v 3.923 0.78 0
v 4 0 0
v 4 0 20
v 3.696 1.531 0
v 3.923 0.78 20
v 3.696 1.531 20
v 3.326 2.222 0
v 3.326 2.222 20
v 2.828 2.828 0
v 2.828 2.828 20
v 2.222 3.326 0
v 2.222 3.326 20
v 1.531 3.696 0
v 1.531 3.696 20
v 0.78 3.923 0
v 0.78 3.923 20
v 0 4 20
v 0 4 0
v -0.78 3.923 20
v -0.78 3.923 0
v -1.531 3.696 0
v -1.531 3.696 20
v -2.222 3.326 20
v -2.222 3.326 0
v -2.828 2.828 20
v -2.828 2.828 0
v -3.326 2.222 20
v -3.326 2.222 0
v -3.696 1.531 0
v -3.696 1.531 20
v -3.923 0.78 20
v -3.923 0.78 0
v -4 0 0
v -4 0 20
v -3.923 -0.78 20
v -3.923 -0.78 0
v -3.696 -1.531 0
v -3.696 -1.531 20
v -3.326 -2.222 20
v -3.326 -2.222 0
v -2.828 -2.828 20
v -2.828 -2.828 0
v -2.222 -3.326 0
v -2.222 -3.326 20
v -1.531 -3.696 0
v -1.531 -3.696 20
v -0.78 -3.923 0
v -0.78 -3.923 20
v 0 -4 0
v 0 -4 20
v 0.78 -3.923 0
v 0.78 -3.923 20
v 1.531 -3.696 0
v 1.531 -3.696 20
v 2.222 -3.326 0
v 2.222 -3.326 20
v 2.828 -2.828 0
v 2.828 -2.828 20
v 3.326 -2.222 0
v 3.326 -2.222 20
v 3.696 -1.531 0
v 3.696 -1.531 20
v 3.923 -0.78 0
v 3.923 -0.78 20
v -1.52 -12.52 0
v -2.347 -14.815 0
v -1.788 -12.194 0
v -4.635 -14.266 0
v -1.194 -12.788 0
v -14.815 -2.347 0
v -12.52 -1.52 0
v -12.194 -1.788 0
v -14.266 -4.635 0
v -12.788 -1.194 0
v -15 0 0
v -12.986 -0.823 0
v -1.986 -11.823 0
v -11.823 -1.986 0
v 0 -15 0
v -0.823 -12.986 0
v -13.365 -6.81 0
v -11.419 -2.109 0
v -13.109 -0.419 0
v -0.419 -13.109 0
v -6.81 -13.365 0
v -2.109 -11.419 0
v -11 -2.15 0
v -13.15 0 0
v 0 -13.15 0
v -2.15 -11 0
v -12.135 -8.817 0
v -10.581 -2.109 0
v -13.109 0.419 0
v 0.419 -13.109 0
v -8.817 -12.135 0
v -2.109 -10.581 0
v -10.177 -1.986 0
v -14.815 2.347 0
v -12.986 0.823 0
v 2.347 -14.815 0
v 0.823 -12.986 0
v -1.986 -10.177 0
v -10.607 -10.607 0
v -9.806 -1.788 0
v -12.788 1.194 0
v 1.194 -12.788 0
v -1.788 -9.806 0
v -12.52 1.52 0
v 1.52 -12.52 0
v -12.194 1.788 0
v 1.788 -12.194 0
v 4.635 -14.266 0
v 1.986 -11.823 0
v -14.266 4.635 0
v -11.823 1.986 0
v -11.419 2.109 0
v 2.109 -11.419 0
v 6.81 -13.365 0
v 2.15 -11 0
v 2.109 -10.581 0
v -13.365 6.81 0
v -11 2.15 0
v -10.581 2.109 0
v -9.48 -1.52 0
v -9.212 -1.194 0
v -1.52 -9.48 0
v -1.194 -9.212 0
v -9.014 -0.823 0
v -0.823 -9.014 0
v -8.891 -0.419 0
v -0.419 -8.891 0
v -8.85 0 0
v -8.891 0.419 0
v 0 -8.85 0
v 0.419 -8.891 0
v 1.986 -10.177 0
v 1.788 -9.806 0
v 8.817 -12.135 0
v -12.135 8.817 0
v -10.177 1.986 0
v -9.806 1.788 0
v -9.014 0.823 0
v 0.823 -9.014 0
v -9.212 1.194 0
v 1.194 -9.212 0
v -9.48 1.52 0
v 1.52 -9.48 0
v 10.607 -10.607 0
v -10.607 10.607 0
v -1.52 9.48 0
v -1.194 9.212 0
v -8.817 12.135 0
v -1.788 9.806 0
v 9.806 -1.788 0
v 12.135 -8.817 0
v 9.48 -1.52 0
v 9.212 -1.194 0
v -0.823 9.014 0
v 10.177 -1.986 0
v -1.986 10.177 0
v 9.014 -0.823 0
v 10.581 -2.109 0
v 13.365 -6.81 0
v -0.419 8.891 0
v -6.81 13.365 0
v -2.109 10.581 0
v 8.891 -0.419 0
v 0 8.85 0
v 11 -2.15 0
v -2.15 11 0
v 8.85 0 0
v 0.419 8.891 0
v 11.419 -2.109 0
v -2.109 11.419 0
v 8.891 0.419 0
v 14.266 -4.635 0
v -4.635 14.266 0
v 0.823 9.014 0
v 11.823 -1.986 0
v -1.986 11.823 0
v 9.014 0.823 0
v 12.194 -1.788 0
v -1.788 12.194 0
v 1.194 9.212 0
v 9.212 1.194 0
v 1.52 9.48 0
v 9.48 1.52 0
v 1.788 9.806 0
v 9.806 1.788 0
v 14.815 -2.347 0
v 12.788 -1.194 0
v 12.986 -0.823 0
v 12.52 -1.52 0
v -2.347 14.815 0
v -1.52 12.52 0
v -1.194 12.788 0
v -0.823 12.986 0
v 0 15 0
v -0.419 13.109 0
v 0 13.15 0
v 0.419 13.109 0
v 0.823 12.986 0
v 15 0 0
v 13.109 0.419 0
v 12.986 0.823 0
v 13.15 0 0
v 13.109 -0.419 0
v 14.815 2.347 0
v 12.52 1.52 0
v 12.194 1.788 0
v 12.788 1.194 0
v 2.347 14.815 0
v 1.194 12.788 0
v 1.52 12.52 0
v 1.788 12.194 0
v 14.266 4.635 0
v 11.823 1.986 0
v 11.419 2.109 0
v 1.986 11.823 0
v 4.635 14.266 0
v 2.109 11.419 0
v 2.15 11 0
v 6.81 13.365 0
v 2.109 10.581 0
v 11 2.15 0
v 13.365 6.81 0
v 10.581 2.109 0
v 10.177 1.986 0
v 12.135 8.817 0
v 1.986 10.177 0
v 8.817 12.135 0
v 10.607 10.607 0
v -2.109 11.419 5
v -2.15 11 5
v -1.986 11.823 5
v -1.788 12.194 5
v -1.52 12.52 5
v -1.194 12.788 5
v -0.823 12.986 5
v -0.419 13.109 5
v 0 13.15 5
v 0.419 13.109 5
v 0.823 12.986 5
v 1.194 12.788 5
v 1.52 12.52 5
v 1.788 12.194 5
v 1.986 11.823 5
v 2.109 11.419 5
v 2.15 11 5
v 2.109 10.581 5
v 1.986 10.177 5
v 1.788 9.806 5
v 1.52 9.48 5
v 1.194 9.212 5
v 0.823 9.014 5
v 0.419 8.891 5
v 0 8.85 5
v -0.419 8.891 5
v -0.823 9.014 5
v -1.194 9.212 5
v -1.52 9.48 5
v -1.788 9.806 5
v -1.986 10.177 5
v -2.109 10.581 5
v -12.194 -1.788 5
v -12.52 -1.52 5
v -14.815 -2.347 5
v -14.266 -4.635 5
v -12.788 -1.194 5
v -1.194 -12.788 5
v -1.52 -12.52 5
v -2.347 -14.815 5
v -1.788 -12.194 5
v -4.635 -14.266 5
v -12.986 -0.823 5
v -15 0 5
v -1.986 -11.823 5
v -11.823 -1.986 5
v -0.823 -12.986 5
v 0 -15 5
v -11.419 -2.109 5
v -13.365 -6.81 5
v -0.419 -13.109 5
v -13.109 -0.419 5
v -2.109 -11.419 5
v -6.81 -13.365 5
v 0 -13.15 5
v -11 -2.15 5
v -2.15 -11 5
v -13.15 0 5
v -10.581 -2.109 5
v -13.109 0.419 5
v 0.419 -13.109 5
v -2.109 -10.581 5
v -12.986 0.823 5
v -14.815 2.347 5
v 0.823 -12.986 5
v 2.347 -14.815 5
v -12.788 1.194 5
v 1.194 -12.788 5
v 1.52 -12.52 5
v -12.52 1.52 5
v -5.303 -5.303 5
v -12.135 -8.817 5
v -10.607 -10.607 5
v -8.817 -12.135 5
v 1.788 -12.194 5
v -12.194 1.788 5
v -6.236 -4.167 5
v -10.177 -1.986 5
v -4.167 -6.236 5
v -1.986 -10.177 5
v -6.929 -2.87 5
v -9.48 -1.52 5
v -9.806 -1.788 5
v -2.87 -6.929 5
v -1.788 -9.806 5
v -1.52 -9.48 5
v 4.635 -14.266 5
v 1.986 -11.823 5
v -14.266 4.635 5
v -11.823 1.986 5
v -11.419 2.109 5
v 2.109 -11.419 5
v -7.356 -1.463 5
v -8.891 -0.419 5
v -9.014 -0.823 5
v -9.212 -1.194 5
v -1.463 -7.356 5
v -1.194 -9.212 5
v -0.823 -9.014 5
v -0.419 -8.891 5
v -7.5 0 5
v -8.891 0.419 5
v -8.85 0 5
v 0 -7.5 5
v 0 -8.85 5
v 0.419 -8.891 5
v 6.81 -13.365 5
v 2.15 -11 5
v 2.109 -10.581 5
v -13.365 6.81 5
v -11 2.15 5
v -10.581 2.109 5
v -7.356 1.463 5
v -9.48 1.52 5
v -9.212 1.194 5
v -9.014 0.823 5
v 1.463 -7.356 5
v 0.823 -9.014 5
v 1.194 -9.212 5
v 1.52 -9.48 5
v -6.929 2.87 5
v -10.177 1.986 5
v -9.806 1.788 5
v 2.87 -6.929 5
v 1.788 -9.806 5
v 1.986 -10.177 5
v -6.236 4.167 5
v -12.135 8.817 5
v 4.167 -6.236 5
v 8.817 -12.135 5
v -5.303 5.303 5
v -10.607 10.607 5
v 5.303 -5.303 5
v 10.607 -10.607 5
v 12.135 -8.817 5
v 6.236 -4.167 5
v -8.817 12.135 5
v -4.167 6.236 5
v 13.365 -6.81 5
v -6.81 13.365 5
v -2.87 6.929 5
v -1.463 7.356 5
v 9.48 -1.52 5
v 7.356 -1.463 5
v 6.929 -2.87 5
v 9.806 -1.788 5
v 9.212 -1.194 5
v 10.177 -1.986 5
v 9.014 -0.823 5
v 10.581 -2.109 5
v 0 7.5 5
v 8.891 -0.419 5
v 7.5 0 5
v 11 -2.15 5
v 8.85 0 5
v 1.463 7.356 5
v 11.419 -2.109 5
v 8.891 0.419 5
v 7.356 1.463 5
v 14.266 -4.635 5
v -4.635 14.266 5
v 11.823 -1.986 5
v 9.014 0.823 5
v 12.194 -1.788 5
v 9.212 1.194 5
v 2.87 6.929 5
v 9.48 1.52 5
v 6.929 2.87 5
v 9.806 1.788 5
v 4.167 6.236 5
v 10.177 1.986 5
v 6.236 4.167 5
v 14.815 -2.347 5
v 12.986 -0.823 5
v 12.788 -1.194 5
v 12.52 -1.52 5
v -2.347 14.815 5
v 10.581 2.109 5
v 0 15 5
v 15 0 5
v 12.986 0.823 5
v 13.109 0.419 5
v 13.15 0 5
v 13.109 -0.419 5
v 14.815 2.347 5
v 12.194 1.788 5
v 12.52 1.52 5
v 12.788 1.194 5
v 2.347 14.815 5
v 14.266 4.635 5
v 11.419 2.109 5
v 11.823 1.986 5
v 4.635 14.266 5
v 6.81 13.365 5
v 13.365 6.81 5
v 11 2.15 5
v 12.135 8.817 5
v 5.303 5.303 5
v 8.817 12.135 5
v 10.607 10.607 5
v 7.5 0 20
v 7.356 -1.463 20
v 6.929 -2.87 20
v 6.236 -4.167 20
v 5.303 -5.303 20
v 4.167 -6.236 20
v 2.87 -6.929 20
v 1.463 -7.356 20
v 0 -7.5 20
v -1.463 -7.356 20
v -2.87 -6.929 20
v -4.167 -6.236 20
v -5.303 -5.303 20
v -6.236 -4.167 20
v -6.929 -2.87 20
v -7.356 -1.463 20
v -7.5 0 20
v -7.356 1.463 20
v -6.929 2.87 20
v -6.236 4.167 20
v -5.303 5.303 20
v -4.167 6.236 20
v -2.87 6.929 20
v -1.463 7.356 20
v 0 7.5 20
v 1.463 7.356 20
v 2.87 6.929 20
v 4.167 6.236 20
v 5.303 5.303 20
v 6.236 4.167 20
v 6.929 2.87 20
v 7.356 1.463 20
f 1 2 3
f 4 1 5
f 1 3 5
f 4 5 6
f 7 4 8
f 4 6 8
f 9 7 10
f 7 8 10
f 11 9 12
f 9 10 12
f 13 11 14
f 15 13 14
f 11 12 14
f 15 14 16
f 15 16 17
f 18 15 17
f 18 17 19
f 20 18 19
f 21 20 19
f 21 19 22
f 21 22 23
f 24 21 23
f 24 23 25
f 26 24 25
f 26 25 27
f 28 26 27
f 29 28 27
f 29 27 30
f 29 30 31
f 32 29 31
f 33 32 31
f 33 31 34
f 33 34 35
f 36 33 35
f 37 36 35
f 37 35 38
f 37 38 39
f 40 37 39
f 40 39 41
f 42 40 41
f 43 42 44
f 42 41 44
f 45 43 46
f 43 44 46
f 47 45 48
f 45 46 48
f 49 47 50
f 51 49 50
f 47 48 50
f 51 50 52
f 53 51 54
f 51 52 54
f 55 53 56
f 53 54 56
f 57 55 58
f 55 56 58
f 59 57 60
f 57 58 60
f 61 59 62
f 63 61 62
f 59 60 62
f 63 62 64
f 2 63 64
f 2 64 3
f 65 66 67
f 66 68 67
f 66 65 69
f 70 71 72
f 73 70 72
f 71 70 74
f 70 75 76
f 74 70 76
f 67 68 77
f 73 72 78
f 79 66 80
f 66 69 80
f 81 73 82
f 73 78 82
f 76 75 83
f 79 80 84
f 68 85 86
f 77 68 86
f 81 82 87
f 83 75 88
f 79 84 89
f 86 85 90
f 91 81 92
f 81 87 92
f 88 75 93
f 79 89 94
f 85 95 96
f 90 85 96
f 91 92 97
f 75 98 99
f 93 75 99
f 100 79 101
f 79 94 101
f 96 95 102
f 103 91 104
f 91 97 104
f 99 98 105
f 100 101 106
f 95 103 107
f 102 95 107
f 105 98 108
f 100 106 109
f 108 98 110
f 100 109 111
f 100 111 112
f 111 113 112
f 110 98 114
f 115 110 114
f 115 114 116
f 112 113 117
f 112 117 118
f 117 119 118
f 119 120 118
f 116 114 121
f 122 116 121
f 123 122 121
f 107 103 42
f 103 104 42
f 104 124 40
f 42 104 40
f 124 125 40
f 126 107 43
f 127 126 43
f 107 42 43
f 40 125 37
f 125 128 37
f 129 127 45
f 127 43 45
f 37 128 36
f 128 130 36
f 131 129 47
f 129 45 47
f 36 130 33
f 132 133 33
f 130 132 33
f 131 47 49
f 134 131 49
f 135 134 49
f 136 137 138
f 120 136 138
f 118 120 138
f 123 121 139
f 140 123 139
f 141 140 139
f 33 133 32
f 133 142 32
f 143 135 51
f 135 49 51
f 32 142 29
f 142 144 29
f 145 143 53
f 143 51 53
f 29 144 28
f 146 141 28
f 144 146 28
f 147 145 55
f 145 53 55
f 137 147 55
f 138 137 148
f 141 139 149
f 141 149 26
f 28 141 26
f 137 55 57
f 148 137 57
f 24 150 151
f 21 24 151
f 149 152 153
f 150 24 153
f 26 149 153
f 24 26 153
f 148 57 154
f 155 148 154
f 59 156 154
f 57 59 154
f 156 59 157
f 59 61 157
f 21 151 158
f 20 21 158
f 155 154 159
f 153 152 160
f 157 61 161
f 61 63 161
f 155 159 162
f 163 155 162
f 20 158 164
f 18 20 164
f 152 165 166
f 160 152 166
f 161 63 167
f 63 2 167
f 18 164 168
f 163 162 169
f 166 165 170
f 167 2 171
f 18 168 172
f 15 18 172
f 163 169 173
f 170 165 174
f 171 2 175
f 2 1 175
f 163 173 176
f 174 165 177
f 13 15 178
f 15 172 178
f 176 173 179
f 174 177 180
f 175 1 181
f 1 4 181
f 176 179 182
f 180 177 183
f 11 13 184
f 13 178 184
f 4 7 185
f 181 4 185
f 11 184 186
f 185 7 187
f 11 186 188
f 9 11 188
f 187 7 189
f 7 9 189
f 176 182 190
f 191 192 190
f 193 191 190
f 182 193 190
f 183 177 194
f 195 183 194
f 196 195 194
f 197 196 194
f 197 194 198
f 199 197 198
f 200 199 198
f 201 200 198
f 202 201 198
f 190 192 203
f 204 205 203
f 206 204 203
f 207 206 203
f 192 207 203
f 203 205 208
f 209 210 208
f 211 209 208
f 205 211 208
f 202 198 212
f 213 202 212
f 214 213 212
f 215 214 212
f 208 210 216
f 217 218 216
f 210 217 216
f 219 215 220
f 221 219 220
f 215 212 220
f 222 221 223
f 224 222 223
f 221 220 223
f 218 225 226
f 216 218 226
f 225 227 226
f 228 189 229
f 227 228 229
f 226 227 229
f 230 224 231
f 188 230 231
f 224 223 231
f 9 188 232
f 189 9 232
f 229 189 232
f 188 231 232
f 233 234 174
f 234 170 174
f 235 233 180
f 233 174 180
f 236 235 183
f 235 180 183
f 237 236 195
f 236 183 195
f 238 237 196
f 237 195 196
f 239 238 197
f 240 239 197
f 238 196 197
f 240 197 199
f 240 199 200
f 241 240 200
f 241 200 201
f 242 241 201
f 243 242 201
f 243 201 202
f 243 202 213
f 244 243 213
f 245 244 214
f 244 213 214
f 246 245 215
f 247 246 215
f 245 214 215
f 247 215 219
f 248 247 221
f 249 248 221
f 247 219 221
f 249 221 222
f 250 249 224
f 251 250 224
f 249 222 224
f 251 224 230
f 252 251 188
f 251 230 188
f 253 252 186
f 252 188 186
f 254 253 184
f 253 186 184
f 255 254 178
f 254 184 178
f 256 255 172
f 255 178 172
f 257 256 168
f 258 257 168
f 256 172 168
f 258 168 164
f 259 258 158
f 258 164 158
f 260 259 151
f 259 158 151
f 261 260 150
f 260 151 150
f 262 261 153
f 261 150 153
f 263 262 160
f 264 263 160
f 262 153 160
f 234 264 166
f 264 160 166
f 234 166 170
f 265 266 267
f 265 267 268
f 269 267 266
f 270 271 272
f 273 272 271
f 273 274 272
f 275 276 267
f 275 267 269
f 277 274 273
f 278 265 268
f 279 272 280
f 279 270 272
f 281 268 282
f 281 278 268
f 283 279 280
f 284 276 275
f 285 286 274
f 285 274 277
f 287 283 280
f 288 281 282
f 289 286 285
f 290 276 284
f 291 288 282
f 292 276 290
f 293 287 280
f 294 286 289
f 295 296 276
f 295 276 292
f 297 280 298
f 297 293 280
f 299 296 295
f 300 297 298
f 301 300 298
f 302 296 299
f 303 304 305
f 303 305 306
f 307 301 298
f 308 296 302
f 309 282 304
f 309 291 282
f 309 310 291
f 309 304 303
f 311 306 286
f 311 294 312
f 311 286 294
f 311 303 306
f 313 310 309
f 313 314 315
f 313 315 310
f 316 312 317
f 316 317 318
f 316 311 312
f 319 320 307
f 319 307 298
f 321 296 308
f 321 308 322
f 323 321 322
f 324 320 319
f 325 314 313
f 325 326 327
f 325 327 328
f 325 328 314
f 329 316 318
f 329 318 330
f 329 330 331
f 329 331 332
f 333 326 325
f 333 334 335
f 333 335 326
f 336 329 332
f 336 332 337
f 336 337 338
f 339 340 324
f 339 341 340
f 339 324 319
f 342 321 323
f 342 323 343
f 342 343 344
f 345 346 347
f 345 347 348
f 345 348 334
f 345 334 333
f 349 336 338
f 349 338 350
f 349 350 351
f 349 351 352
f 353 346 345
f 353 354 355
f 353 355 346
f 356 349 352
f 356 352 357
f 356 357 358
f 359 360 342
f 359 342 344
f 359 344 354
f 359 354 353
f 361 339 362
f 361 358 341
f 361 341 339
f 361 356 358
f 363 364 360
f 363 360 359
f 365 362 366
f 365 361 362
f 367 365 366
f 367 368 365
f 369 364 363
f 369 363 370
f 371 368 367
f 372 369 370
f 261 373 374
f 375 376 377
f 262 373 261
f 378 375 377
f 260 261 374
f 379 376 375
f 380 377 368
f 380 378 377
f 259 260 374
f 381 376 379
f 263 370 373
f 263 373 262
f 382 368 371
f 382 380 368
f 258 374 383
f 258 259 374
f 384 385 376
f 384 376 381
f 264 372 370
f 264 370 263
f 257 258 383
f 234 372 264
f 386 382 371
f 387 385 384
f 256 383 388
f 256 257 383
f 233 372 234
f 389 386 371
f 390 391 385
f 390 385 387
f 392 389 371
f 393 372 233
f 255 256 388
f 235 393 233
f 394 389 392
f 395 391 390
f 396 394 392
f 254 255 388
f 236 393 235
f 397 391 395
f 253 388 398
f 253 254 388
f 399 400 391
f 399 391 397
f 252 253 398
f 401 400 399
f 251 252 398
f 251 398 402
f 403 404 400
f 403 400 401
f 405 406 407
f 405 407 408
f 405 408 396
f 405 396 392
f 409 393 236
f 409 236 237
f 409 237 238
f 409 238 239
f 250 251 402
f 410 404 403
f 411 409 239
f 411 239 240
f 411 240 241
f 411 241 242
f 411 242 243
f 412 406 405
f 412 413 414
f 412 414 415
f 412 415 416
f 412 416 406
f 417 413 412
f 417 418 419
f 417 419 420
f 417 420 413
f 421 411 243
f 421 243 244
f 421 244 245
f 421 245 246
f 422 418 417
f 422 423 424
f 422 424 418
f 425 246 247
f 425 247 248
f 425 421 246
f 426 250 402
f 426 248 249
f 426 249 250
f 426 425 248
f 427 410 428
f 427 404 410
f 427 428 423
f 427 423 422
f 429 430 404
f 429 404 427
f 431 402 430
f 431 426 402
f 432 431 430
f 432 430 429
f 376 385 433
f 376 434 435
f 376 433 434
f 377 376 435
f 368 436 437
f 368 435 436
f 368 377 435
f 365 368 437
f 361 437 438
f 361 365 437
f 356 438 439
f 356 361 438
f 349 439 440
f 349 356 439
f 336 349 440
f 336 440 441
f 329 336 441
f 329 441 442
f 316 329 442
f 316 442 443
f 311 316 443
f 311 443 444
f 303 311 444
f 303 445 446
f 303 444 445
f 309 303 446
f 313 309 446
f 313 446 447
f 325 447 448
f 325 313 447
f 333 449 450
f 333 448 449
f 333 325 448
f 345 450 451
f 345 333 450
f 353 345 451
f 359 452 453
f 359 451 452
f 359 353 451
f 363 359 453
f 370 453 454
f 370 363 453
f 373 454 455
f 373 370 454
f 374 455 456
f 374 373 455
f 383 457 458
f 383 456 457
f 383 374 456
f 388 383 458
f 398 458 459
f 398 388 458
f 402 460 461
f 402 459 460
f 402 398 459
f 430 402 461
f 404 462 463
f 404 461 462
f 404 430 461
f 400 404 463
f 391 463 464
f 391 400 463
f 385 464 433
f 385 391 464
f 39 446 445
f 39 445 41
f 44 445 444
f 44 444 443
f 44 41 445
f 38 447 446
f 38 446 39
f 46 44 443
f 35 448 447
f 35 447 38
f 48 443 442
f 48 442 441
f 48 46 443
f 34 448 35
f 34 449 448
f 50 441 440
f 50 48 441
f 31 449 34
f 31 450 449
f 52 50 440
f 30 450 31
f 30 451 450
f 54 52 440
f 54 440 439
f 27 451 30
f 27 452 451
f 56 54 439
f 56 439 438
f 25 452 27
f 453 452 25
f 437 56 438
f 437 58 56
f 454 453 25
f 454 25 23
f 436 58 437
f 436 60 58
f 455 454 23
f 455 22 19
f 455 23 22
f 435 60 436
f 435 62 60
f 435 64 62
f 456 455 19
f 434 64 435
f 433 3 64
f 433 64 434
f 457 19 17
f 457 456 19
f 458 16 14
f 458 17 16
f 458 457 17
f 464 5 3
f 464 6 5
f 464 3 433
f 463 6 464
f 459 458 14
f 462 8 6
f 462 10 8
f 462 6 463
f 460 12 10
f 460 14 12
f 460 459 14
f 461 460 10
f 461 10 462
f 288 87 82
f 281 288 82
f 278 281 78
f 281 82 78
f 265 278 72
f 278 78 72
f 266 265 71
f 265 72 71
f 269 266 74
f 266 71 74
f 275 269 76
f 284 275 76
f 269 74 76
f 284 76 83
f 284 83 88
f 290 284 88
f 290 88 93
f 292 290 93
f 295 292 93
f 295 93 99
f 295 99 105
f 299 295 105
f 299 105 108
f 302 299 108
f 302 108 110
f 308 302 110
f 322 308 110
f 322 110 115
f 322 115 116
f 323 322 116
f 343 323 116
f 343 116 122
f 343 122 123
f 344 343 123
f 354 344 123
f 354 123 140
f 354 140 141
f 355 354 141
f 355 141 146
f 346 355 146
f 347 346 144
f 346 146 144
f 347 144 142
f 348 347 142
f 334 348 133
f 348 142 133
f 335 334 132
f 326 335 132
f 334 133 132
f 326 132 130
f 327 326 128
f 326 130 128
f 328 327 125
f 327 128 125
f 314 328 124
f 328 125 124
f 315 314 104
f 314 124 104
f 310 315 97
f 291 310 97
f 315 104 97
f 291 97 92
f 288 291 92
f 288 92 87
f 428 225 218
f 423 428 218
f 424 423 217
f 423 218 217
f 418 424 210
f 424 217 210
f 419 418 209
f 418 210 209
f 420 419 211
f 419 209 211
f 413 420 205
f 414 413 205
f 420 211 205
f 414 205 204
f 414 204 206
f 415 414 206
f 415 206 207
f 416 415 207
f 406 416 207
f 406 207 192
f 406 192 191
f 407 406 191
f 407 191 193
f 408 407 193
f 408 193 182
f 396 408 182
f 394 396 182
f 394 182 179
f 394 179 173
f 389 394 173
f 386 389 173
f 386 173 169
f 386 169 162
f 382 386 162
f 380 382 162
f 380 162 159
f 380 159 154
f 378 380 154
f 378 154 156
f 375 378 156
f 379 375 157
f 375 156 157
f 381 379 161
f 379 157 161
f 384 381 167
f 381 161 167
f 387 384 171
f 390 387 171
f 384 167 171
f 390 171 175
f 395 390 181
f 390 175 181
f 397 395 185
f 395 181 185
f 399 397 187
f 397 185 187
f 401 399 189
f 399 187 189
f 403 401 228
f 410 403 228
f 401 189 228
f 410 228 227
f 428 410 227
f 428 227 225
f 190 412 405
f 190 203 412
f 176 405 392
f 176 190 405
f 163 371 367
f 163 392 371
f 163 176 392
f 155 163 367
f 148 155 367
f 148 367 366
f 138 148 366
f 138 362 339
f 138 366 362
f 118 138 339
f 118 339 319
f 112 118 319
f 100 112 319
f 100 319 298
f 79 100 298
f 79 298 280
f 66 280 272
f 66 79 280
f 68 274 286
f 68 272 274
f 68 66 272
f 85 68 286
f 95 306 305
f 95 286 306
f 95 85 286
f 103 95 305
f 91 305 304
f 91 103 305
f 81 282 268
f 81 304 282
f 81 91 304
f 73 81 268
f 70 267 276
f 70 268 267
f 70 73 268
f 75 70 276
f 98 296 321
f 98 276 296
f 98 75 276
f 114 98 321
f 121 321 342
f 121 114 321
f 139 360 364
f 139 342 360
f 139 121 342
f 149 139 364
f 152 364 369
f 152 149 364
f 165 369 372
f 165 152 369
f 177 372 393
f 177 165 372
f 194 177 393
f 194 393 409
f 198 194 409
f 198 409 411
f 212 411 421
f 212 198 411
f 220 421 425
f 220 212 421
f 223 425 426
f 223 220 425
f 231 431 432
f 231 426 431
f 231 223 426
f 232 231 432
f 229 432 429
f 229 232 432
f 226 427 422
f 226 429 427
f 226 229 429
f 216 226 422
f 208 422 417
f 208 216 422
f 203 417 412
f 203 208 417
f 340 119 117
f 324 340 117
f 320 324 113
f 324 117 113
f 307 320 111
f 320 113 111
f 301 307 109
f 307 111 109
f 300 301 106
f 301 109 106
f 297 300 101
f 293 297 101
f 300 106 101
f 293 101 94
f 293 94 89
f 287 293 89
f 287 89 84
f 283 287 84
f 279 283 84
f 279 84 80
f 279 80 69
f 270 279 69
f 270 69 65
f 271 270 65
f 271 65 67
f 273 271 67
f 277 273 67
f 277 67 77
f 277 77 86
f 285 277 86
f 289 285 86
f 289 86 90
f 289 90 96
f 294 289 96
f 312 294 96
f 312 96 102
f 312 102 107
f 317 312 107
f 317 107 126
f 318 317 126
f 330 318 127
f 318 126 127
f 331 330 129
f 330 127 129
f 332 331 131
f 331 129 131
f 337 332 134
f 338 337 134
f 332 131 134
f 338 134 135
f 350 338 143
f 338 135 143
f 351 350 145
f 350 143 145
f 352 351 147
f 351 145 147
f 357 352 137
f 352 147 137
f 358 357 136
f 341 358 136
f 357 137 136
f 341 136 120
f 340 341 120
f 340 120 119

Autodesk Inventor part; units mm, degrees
ref_plane "YZ Plane" through (0, 0, 0) normal (1, 0, 0) x (0, 1, 0)
ref_plane "XZ Plane" through (0, 0, 0) normal (0, 1, 0) x (-1, 0, 0)
ref_plane "XY Plane" through (0, 0, 0) normal (0, 0, 1) x (1, 0, 0)
sketch "Sketch1" plane through (0, 0, 0) normal (0, 0, 1) x (1, 0, 0)
  circle A0 centre (0, 0) radius 15
  dimension "d0" = 30
extrude "Extrusion1" add sketch "Sketch1" along normal blind 5
sketch "Sketch2" plane through (0, 0, 5) normal (0, 0, 1) x (1, 0, 0)
  circle A0 centre (0, 0) radius 15 projected
  circle A1 centre (0, 0) radius 7.5
  dimension "d4" = 15
extrude "Extrusion2" add sketch "Sketch2" along normal blind 15 contours A1
sketch "Sketch3" plane through (0, 0, 20) normal (0, 0, 1) x (1, 0, 0)
  circle A0 centre (0, 0) radius 7.5 projected
  circle A1 centre (0, 0) radius 4
  dimension "d8" = 8
extrude "Extrusion3" cut sketch "Sketch3" against normal through all contours A1
sketch "Sketch4" plane through (0, 0, 0) normal (0, 0, -1) x (-1, 0, 0)
  circle A0 centre (0, 0) radius 4 projected
  circle A1 centre (0, 11) radius 2.15
  dimension "d13" = 11
  dimension "d14" = 4.3
extrude "Extrusion4" cut sketch "Sketch4" against normal through all contours A1
pattern_circular "Circular Pattern1" count 4 over 360 about axis through (0, 0, 0) along (0, 0, 1) of "Extrusion4"
properties part number "lead nut"
